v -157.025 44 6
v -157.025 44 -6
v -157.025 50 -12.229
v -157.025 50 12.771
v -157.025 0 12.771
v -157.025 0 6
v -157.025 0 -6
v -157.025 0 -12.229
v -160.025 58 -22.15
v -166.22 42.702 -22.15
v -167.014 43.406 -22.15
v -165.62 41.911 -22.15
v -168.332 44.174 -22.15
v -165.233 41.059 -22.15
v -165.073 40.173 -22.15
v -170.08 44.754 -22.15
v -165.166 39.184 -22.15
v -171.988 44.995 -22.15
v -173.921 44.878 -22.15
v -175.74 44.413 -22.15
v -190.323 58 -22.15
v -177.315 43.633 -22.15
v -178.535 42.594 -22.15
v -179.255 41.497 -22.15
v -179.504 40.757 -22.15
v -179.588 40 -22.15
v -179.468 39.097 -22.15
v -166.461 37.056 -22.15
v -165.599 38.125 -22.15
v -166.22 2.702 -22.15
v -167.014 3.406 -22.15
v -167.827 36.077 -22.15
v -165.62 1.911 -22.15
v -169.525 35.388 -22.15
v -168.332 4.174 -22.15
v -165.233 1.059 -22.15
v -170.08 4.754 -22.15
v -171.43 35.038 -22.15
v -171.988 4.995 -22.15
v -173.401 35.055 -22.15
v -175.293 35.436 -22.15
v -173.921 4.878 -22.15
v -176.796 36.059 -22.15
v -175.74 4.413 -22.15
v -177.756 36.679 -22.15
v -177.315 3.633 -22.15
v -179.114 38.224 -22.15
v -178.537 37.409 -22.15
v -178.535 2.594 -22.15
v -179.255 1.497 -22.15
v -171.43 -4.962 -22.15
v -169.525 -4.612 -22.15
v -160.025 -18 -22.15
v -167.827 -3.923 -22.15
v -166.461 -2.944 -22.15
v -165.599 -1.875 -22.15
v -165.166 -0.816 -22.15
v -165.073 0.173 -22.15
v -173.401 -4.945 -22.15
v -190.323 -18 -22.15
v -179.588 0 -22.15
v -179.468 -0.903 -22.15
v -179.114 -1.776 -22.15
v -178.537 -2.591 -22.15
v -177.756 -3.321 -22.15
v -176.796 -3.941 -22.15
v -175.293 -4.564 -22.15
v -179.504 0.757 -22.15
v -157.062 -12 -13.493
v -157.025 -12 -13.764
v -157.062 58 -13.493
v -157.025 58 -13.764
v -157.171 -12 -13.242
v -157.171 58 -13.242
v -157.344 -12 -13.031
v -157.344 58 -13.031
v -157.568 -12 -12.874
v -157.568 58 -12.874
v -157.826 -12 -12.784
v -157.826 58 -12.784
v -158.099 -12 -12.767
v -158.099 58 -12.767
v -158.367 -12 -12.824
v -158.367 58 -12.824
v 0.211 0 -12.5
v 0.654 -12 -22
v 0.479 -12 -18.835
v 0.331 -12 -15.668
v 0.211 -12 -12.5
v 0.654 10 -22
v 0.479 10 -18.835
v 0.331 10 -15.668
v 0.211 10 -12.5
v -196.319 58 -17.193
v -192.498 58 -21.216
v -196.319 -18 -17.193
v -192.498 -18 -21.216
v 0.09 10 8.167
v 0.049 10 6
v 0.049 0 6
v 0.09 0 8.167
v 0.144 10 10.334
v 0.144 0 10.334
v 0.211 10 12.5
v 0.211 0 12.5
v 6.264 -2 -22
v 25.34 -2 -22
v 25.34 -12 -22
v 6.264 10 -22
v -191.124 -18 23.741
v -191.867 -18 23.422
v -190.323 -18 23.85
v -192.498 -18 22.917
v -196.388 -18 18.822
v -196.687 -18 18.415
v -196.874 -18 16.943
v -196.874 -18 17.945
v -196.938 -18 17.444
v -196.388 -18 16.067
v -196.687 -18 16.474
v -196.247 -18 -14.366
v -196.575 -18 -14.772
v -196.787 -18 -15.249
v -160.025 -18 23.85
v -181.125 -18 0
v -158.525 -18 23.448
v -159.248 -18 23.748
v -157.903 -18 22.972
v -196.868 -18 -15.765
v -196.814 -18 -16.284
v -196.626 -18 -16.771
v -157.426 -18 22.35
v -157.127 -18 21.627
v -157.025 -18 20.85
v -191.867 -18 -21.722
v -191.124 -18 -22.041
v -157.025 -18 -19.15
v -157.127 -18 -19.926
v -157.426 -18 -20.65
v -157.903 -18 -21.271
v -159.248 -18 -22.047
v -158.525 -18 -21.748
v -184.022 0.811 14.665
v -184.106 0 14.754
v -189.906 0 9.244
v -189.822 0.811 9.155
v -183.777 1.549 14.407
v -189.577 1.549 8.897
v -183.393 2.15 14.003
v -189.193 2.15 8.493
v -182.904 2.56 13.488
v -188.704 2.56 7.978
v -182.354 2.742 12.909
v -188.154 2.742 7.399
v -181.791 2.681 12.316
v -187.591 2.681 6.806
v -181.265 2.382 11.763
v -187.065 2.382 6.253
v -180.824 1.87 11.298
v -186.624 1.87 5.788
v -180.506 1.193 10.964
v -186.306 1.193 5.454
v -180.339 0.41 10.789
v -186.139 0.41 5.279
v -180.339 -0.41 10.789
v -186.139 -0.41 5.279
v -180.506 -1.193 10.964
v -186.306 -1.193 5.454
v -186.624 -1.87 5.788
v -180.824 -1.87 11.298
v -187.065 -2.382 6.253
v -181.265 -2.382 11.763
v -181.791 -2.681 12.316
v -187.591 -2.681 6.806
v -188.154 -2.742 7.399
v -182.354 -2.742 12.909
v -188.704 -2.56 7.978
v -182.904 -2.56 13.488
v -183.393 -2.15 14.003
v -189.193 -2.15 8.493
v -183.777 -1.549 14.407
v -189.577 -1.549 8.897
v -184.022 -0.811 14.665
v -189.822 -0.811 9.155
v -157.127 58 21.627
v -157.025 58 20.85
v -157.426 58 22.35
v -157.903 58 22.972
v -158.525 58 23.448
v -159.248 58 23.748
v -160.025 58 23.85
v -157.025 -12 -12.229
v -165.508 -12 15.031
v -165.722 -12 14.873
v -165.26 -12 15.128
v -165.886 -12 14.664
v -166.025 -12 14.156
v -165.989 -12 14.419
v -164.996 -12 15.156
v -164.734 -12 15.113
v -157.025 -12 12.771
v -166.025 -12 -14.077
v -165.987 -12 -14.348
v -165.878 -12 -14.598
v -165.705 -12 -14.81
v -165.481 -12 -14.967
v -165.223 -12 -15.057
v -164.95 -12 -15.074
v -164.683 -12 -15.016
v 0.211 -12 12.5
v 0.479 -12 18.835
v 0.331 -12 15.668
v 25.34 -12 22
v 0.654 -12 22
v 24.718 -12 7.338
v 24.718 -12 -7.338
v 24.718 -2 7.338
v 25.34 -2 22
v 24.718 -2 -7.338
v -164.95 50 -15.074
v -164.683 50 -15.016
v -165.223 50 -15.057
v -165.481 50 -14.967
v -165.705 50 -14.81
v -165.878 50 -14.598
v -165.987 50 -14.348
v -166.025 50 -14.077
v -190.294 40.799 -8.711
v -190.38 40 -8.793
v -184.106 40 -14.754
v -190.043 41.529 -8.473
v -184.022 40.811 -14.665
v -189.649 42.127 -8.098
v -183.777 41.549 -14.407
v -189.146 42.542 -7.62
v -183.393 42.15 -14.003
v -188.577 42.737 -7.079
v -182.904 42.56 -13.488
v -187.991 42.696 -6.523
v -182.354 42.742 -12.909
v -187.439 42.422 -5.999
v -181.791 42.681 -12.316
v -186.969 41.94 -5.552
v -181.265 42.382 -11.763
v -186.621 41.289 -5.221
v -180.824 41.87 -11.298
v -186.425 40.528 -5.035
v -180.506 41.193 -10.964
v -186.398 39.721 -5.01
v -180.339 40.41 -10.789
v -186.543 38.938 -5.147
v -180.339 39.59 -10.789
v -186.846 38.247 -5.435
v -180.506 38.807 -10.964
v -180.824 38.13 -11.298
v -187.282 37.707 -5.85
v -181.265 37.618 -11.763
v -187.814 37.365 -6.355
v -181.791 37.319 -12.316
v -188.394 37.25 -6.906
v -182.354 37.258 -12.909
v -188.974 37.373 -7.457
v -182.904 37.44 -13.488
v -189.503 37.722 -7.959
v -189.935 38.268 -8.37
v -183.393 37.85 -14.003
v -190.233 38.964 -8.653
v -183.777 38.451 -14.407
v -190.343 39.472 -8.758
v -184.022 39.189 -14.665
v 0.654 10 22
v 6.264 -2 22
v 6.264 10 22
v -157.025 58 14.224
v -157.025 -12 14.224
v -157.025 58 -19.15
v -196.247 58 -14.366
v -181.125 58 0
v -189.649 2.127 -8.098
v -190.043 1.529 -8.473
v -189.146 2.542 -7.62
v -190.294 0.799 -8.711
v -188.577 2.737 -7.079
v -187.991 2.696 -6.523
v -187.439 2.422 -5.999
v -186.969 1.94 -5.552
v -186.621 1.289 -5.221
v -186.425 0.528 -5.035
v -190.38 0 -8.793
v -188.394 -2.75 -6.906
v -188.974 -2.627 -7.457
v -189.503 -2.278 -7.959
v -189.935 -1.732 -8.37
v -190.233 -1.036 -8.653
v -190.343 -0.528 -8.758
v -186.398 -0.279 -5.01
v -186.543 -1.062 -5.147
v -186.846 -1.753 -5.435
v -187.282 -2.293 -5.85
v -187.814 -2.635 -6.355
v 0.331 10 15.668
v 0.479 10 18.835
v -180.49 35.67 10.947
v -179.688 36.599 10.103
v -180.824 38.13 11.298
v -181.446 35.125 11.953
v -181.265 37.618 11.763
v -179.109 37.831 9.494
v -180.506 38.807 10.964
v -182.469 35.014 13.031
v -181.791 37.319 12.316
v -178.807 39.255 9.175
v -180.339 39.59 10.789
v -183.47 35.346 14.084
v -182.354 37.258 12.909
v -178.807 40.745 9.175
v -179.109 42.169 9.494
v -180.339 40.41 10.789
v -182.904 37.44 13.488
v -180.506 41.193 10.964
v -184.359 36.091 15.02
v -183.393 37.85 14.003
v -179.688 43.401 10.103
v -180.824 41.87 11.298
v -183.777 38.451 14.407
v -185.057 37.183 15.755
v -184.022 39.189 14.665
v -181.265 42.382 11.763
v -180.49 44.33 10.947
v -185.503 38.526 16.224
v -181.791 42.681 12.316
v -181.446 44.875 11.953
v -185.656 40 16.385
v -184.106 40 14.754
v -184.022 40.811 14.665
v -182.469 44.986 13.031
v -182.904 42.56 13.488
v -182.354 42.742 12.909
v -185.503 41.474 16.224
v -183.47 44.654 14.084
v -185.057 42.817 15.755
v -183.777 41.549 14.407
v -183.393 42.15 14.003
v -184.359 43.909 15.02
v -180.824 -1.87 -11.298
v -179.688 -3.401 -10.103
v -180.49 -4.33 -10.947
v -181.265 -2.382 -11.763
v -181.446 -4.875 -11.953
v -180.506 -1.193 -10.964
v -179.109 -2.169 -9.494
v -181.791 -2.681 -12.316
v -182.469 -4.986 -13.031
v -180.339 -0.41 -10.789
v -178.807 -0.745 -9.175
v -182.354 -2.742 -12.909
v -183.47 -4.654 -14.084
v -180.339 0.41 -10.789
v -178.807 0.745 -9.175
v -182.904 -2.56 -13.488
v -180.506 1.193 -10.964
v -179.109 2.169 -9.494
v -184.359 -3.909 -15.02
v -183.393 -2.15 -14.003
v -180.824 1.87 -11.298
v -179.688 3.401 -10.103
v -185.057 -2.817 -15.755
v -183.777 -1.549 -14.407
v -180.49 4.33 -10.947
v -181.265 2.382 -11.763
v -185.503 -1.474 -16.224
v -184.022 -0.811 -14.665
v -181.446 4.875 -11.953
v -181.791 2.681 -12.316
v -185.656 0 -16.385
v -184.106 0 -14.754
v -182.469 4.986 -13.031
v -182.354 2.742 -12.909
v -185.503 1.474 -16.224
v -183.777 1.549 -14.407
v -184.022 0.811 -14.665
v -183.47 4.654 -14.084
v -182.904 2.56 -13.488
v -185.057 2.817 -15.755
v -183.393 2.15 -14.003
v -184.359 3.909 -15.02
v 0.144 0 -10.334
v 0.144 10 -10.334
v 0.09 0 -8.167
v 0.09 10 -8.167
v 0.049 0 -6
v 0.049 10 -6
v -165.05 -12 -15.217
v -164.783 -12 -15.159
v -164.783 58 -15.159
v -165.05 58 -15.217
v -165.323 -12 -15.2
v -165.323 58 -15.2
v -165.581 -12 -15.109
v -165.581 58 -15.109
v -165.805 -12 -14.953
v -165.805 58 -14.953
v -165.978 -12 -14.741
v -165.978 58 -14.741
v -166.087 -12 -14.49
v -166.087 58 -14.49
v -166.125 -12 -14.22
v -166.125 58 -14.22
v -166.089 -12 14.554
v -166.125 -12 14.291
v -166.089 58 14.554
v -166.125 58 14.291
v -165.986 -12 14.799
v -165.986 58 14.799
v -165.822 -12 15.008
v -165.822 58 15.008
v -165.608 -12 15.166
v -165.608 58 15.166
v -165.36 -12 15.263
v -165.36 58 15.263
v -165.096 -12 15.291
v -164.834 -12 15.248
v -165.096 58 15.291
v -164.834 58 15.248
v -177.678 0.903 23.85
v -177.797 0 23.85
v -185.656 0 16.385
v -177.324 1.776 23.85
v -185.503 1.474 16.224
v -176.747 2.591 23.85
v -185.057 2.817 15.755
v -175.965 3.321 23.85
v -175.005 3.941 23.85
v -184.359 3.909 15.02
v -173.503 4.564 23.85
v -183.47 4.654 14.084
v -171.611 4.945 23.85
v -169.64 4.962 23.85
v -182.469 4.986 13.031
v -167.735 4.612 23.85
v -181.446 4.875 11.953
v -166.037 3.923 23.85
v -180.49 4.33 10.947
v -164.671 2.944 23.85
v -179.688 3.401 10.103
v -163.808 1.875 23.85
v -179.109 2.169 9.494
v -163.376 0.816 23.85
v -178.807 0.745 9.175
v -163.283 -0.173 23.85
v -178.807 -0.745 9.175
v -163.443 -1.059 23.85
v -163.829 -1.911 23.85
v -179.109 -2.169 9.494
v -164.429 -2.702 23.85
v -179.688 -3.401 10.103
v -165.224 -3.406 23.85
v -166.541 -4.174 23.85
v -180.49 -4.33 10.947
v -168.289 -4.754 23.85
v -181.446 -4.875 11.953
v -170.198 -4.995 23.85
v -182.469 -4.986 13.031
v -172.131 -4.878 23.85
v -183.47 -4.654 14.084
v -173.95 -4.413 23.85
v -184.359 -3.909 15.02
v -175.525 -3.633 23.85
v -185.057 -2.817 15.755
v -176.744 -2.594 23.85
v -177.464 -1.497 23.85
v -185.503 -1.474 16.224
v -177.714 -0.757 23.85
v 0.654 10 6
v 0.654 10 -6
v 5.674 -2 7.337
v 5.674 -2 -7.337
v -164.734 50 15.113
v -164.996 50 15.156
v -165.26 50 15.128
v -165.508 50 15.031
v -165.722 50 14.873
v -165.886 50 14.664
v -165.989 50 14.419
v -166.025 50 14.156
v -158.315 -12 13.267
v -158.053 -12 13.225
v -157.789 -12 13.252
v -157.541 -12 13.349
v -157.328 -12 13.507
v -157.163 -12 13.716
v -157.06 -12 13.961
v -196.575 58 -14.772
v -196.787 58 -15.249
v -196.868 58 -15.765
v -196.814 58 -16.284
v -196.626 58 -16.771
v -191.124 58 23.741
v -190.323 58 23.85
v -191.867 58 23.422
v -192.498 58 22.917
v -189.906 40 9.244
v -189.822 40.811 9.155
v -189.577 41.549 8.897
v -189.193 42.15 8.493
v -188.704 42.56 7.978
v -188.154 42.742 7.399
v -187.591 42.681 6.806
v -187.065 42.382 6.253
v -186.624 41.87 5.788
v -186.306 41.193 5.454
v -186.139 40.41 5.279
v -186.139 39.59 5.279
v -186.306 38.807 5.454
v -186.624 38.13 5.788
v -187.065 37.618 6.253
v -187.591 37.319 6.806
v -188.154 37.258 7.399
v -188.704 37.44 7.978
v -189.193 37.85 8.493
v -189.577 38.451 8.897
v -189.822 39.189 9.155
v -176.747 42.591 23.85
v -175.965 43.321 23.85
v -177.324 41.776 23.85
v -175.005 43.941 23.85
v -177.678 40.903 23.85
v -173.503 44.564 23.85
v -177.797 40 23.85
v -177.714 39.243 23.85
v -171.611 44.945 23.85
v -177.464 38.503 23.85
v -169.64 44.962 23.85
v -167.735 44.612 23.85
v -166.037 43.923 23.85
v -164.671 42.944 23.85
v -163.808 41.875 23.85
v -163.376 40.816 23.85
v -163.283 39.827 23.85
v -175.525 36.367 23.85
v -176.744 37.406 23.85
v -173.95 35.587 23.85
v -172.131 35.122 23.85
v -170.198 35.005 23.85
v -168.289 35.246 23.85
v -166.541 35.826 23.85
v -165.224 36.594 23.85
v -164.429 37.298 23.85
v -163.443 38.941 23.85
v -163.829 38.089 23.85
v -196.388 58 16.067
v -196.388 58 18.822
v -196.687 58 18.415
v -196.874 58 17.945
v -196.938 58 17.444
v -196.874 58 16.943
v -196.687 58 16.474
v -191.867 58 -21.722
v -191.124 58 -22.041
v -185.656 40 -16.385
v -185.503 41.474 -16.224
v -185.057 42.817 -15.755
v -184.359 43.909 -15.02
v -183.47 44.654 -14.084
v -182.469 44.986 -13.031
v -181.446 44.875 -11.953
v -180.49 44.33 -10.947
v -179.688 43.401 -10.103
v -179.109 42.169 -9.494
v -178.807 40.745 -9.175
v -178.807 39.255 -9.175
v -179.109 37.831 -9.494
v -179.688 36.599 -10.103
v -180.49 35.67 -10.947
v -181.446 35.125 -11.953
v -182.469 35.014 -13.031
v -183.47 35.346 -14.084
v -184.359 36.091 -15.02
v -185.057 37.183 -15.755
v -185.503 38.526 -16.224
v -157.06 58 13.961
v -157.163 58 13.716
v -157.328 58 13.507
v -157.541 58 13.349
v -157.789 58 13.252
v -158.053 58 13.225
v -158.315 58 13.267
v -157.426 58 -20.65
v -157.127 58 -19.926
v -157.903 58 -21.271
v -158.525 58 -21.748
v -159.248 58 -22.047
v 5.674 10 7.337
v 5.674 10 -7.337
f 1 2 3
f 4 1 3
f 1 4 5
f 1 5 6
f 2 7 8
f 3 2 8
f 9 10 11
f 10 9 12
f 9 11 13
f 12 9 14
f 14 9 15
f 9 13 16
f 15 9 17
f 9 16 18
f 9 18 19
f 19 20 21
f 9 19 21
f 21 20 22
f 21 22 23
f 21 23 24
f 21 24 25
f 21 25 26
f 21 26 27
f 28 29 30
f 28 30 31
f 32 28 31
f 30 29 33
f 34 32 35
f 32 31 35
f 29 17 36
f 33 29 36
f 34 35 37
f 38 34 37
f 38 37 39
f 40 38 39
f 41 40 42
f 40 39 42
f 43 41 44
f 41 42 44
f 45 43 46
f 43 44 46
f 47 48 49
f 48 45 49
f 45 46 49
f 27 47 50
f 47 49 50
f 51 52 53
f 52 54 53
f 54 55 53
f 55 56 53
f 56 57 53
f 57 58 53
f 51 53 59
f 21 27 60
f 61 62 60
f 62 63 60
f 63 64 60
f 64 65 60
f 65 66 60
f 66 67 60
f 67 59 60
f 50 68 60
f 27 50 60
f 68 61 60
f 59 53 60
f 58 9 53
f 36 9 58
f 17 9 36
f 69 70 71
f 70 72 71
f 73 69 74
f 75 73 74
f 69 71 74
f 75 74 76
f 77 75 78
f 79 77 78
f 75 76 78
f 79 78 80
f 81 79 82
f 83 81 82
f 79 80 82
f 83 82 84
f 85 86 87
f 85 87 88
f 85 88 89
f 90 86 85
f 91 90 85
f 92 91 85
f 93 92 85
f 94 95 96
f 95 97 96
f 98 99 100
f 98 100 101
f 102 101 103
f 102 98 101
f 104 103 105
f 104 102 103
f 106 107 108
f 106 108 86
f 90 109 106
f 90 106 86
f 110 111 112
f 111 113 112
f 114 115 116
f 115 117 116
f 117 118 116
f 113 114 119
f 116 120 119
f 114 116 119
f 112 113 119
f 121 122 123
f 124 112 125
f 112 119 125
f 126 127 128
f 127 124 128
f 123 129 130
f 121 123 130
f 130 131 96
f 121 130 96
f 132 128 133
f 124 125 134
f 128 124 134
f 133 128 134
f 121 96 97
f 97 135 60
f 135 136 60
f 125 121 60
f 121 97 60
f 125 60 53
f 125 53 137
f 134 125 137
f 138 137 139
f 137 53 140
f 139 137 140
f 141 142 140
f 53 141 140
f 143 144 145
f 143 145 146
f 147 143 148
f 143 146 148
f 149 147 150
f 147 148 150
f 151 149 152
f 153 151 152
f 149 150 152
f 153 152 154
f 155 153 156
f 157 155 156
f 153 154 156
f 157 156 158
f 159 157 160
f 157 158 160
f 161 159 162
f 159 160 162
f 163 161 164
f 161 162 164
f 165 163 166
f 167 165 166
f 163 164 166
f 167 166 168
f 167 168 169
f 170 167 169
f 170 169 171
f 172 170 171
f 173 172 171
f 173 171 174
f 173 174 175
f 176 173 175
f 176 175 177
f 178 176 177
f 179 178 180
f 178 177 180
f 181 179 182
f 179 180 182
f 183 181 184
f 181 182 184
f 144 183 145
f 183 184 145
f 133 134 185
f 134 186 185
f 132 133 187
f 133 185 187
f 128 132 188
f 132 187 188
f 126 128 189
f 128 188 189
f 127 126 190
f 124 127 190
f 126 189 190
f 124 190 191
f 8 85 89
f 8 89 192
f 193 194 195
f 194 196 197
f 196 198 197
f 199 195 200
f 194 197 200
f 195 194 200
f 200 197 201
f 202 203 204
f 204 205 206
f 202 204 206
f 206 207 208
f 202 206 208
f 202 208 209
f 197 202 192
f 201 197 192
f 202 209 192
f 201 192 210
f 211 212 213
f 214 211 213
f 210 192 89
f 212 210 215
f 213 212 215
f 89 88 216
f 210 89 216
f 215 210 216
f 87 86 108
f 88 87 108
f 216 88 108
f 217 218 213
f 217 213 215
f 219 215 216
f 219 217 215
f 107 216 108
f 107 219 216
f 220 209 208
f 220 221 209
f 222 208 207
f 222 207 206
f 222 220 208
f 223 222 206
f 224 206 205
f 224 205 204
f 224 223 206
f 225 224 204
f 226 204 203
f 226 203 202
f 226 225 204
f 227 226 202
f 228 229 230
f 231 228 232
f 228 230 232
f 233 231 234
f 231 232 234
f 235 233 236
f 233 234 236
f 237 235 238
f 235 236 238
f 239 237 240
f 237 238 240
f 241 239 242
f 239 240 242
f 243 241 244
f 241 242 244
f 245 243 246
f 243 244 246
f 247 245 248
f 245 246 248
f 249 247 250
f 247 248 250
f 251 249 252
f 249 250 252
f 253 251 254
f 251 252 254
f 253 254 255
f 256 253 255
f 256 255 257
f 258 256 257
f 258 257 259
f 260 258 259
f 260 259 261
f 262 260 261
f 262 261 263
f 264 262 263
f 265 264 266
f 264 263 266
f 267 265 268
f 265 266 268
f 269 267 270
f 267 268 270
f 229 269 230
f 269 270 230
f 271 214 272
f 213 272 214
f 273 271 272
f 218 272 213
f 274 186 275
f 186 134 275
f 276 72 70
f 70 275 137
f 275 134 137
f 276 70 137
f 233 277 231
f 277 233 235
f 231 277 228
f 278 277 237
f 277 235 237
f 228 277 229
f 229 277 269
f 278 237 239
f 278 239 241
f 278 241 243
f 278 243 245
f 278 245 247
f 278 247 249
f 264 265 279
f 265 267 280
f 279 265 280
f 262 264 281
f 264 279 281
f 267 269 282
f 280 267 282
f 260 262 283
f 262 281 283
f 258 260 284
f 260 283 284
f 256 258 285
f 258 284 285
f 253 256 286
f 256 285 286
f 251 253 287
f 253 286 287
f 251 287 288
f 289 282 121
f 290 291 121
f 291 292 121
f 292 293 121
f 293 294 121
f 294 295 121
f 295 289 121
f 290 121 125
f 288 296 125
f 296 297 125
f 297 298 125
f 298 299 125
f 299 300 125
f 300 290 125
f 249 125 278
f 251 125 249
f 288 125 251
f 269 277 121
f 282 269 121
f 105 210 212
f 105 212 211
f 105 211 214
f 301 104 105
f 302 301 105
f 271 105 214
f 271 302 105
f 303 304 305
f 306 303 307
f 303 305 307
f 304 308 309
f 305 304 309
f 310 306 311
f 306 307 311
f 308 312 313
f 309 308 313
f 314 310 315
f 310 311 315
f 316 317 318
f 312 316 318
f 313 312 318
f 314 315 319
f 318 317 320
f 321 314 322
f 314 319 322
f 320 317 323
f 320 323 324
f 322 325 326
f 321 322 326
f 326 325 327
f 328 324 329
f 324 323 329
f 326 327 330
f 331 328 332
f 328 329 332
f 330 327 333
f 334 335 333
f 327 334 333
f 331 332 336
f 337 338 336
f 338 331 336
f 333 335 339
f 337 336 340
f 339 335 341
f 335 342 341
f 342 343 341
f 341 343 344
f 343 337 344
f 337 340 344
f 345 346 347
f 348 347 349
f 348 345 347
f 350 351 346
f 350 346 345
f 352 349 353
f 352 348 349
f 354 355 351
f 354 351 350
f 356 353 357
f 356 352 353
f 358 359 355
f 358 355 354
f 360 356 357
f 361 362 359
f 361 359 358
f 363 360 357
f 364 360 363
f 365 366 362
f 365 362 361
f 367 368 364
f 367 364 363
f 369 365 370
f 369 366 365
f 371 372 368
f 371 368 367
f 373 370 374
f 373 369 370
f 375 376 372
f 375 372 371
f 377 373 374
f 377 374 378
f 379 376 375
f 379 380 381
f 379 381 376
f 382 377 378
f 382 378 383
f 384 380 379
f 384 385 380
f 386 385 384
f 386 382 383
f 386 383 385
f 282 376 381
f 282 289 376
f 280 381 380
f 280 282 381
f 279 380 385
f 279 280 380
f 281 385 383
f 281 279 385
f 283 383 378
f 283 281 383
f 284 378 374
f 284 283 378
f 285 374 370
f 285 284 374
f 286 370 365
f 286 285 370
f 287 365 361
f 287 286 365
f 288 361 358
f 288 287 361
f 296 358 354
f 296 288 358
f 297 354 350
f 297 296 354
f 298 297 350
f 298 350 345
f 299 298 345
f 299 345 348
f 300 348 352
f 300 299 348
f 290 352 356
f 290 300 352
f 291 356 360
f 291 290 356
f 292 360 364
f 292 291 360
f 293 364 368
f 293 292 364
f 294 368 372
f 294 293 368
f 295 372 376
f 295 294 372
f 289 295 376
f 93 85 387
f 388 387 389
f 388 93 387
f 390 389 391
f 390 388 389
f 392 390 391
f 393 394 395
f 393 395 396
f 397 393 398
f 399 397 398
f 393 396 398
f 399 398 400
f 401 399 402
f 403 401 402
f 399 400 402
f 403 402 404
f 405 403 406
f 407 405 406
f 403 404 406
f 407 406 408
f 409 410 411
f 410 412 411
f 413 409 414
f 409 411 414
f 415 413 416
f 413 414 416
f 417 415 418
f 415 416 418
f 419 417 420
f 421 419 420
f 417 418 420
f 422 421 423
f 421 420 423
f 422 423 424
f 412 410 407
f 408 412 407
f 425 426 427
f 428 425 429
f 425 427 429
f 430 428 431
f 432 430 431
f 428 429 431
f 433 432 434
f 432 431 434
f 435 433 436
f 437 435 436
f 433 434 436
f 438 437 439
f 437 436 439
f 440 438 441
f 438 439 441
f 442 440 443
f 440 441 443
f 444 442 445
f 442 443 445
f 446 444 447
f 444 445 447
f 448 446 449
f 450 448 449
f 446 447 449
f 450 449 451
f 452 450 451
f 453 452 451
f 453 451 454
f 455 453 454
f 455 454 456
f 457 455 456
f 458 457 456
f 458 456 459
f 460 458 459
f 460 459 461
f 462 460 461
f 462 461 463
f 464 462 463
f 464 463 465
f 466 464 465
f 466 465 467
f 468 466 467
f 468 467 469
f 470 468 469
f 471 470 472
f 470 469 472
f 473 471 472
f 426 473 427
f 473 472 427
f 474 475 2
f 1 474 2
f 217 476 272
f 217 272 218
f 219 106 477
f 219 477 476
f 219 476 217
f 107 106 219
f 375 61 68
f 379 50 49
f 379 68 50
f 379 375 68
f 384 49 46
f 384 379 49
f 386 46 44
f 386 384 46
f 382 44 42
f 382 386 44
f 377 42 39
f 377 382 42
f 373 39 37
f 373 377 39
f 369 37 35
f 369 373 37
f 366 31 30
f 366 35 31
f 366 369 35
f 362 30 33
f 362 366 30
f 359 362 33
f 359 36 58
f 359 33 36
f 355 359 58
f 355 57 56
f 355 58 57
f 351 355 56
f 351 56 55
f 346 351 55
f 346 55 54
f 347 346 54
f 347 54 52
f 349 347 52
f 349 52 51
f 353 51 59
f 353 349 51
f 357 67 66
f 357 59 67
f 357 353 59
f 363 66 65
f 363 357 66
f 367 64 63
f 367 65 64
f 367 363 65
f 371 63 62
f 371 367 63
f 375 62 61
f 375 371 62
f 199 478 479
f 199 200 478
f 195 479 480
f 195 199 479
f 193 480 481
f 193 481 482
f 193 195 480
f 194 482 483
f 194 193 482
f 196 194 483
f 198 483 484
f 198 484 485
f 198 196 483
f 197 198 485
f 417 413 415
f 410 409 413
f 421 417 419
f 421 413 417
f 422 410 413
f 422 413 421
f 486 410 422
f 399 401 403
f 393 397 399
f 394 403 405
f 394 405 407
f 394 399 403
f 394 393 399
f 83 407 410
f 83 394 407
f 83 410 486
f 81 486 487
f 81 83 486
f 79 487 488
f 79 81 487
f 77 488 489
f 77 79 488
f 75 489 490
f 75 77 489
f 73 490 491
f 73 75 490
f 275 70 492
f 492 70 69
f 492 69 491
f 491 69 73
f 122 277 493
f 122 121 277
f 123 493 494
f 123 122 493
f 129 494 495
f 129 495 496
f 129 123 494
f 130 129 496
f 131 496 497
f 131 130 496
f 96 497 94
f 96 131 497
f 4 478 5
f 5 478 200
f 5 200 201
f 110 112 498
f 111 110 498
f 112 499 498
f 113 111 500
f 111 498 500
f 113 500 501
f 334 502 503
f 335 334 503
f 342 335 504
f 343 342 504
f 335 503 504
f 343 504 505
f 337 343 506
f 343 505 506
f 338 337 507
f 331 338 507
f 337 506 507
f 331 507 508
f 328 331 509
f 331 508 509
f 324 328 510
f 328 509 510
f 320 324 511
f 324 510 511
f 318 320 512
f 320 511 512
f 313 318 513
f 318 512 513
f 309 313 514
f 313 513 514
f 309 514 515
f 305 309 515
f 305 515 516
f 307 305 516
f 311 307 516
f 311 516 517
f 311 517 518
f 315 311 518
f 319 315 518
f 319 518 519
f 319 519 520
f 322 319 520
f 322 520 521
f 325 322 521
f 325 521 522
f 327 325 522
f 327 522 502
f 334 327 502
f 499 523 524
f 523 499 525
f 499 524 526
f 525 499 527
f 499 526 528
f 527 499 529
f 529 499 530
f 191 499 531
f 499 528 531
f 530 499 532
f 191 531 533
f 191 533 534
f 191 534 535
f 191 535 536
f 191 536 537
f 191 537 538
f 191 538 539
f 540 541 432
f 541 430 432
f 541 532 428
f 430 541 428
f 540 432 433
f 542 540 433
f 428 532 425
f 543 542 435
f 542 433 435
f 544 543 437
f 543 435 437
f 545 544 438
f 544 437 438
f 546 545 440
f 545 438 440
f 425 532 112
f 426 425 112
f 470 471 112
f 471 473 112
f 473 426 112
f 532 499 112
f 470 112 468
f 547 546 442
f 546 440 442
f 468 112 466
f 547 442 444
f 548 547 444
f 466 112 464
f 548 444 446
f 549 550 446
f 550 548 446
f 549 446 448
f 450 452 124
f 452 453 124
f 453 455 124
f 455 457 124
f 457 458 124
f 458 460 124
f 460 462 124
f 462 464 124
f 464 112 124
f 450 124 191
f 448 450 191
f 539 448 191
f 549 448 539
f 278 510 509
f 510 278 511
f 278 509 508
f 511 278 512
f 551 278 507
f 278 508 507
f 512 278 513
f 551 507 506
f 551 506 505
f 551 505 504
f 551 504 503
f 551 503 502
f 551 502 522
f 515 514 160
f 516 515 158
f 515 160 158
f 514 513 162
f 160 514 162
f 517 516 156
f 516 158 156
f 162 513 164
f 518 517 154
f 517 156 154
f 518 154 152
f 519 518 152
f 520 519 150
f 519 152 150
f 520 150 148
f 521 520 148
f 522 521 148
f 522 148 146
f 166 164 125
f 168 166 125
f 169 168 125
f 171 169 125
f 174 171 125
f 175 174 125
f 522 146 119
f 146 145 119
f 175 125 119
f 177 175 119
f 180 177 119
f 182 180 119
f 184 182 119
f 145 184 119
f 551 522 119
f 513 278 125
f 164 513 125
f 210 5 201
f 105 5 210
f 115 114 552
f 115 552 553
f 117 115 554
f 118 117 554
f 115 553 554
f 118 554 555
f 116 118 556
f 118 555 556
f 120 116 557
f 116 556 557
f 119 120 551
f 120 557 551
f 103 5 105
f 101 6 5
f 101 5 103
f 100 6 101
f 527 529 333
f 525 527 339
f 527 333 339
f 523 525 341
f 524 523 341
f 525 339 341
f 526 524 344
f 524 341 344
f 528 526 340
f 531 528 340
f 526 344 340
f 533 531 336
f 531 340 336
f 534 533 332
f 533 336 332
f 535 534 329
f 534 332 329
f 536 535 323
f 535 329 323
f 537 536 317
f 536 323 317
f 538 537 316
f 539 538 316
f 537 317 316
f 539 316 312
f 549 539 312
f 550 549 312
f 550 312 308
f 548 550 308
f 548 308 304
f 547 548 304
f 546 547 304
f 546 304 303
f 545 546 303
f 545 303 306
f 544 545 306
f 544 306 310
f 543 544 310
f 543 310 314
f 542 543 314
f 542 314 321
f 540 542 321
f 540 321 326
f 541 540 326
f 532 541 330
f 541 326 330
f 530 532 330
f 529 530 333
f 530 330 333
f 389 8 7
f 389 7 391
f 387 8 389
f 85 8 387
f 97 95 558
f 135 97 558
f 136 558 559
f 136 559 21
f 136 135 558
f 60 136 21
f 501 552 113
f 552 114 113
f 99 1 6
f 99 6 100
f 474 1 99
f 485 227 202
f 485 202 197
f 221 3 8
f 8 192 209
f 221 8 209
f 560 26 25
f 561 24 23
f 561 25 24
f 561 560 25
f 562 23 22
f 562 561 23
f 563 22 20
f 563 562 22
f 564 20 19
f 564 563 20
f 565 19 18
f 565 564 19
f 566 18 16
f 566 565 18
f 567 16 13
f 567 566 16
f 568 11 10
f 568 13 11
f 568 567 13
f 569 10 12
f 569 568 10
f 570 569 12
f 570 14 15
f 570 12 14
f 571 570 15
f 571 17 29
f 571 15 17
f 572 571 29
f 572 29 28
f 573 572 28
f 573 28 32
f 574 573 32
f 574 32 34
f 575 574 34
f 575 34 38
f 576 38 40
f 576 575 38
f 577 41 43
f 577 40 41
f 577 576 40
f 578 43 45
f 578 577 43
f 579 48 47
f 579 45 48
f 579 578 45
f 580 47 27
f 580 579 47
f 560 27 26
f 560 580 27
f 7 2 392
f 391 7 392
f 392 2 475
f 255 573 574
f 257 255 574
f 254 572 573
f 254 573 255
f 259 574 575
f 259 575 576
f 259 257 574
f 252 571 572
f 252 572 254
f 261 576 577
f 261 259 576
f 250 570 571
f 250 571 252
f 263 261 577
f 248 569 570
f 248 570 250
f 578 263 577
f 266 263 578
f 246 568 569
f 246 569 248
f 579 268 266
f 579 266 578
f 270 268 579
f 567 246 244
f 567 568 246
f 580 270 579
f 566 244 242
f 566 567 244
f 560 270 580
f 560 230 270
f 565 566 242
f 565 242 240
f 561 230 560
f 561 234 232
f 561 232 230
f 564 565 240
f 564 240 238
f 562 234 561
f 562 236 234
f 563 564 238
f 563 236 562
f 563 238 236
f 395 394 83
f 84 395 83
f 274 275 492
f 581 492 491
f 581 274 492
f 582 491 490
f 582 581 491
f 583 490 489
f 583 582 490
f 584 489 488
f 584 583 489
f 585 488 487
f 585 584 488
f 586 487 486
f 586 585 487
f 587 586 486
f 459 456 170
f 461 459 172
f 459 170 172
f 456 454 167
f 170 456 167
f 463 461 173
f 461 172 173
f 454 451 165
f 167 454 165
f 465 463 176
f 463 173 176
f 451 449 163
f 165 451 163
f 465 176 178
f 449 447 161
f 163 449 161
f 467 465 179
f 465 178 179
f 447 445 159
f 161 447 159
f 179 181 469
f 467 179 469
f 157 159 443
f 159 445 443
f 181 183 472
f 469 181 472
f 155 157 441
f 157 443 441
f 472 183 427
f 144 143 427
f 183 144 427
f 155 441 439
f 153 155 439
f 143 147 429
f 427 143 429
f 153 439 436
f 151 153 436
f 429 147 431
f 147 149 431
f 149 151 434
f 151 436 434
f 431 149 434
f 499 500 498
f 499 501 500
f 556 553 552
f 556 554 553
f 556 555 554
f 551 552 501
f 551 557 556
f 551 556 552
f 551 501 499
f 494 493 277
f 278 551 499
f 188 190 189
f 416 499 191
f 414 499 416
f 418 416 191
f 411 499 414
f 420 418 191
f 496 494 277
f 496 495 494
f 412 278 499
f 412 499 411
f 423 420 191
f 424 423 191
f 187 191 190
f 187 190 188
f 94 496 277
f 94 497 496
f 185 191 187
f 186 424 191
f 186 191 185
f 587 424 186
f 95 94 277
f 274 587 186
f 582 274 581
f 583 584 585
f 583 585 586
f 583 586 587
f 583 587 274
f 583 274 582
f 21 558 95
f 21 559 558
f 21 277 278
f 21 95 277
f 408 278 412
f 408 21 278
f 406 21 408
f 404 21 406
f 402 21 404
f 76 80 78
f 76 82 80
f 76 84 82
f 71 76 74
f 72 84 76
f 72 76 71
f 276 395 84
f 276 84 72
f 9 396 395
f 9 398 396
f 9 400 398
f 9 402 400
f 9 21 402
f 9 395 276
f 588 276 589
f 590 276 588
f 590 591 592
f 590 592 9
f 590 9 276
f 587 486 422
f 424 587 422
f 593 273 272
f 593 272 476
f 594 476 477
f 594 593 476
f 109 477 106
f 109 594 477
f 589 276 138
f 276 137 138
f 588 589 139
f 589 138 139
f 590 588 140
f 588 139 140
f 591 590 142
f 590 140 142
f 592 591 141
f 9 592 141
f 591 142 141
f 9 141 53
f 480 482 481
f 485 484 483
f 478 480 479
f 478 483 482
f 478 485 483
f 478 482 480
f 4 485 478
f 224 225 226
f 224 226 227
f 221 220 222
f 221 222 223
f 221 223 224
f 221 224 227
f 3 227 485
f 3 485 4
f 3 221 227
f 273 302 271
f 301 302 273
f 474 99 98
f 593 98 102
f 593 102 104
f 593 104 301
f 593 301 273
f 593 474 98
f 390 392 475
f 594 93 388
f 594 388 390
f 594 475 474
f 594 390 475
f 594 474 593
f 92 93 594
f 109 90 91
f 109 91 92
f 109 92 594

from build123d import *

# Parameters (mm, degrees)
BOSS_EXTRUDE2_DEPTH       = 12
BOSS_EXTRUDE3_START       = -2
BOSS_EXTRUDE3_DEPTH       = 10
BOSS_EXTRUDE4_START       = 10
BOSS_EXTRUDE4_DEPTH       = 22
BOSS_EXTRUDE5_START       = -12
BOSS_EXTRUDE5_DEPTH       = 6
BOSS_EXTRUDE6_START       = -12
BOSS_EXTRUDE6_DEPTH       = 70
BOSS_EXTRUDE7_DEPTH       = 50
BOSS_EXTRUDE17_DEPTH      = 6
BOSS_EXTRUDE17_DEPTH_BACK = 6
CUT_EXTRUDE1_START        = -8
SKETCH5_R                 = 5
CUT_EXTRUDE1_DEPTH        = 168.948348154
SKETCH5_3_R               = 2.75
CUT_EXTRUDE2_DEPTH        = 176.948348154
FILLET1_R                 = 1
FILLET2_R                 = 1
FILLET3_R                 = 3
FILLET4_R                 = 2


with BuildPart() as part:
    # Sketch2 → Boss-Extrude2 (new body)
    with BuildSketch(Plane(origin=(0, 0, 0), x_dir=(1, 0, 0), z_dir=(0, 1, 0))):
        with BuildLine():
            Line((0.21086679, 12.5), (-157.02456554, 12.229205734))
            Line((-157.02456554, 12.229205734), (-157.02456554, -12.770794266))
            Line((-157.02456554, -12.770794266), (0.21086679, -12.5))
            ThreePointArc((0.21086679, -12.5), (0, 0), (0.21086679, 12.5))
        make_face()
        Polygon((-157.02456554, 12.229205734), (-166.02456554, 12.213705739), (-166.02456554, -12.786294261), (-157.02456554, -12.770794266), align=None)
        Polygon((-157.02456554, -12.770794266), (-166.02456554, -12.786294261), (-166.02456554, -15.504937842), align=None)
        Polygon((-166.02456554, 15.504937842), (-166.02456554, 12.213705739), (-157.02456554, 12.229205734), align=None)
        with BuildLine():
            ThreePointArc((0.653571446, 22), (0.401744327, 17.25142014), (0.21086679, 12.5))
            ThreePointArc((0.21086679, 12.5), (0, 0), (0.21086679, -12.5))
            ThreePointArc((0.21086679, -12.5), (0.401744327, -17.25142014), (0.653571446, -22))
            Line((0.653571446, -22), (6.263616969, -22))
            ThreePointArc((6.263616969, -22), (5.6, 0), (6.263616969, 22))
            Line((6.263616969, 22), (0.653571446, 22))
        make_face()
    extrude(amount=-BOSS_EXTRUDE2_DEPTH)

    # Sketch2<5> → Boss-Extrude3 (add)
    with BuildSketch(Plane(origin=(0, 0, 0), x_dir=(1, 0, 0), z_dir=(0, 1, 0)).offset(BOSS_EXTRUDE3_START)):
        with BuildLine():
            Line((25.340211435, 22), (6.263616969, 22))
            ThreePointArc((6.263616969, 22), (5.6, 0), (6.263616969, -22))
            Line((6.263616969, -22), (25.340211435, -22))
            ThreePointArc((25.340211435, -22), (24.64, 0), (25.340211435, 22))
        make_face()
    extrude(amount=-BOSS_EXTRUDE3_DEPTH)

    # Sketch2<6> → Boss-Extrude4 (add)
    with BuildSketch(Plane(origin=(0, 0, 0), x_dir=(1, 0, 0), z_dir=(0, 1, 0)).offset(BOSS_EXTRUDE4_START)):
        with BuildLine():
            ThreePointArc((0.653571446, 22), (0.401744327, 17.25142014), (0.21086679, 12.5))
            ThreePointArc((0.21086679, 12.5), (0, 0), (0.21086679, -12.5))
            ThreePointArc((0.21086679, -12.5), (0.401744327, -17.25142014), (0.653571446, -22))
            Line((0.653571446, -22), (6.263616969, -22))
            ThreePointArc((6.263616969, -22), (5.6, 0), (6.263616969, 22))
            Line((6.263616969, 22), (0.653571446, 22))
        make_face()
    extrude(amount=-BOSS_EXTRUDE4_DEPTH)

    # Sketch2<9> → Boss-Extrude7 (add)
    with BuildSketch(Plane(origin=(0, 0, 0), x_dir=(1, 0, 0), z_dir=(0, 1, 0))):
        Polygon((-157.02456554, 12.229205734), (-166.02456554, 12.213705739), (-166.02456554, -12.786294261), (-157.02456554, -12.770794266), align=None)
        Polygon((-166.02456554, 15.504937842), (-166.02456554, 12.213705739), (-157.02456554, 12.229205734), align=None)
        Polygon((-157.02456554, -12.770794266), (-166.02456554, -12.786294261), (-166.02456554, -15.504937842), align=None)
    extrude(amount=BOSS_EXTRUDE7_DEPTH)

    # Sketch4 → Boss-Extrude17 (add, two sides: drawn at the far end of the back side and taken through both)
    with BuildSketch(Plane.XY.offset(-BOSS_EXTRUDE17_DEPTH_BACK)):
        Polygon((0.653571446, 10), (-157.02456554, 44), (-157.02456554, 0), (0.653571446, 0), align=None)
    extrude(amount=BOSS_EXTRUDE17_DEPTH + BOSS_EXTRUDE17_DEPTH_BACK)

    # Fillet2
    fillet2_edges = [part.edges().sort_by_distance(p)[0] for p in [
        (-166.02456554, 19, 15.504937842),
        (-166.02456554, 19, -15.504937842),
    ]]
    fillet(fillet2_edges, radius=FILLET2_R)


with BuildPart() as body_2:
    # Sketch2<7> → Boss-Extrude5 (new body)
    with BuildSketch(Plane(origin=(0, 0, 0), x_dir=(1, 0, 0), z_dir=(0, 1, 0)).offset(BOSS_EXTRUDE5_START)):
        Polygon((-157.02456554, -23.850407561), (-157.02456554, 22.149592439), (-191.610767905, 22.149592439), (-197.696610314, 15.743442535), (-181.12456554, 0), (-197.696610314, -17.444257657), (-191.610767905, -23.850407561), align=None)
    extrude(amount=-BOSS_EXTRUDE5_DEPTH)

    # Sketch2<8> → Boss-Extrude6 (add)
    with BuildSketch(Plane(origin=(0, 0, 0), x_dir=(1, 0, 0), z_dir=(0, 1, 0)).offset(BOSS_EXTRUDE6_START)):
        Polygon((-197.696610314, 15.743442535), (-181.12456554, 0), (-197.696610314, -17.444257657), (-191.610767905, -23.850407561), (-157.02456554, -23.850407561), (-157.02456554, -12.875306975), (-166.12456554, -15.639829924), (-166.12456554, 15.647752643), (-157.02456554, 12.335623511), (-157.02456554, 22.149592439), (-191.610767905, 22.149592439), align=None)
    extrude(amount=BOSS_EXTRUDE6_DEPTH)

    # Sketch5 → Cut-Extrude1 (cut, through all)
    with BuildSketch(Plane(origin=(-95.203451007, 0, -90.443278456), x_dir=(-0.6887494619146907, 0, 0.724999433594416), z_dir=(-0.724999433594416, 0, -0.6887494619146907)).offset(CUT_EXTRUDE1_START)):
        with Locations((134.749447055, 40)):
            Circle(SKETCH5_R)
        with Locations((134.749447055, 0)):
            Circle(SKETCH5_R)
    cut_extrude1 = extrude(amount=-CUT_EXTRUDE1_DEPTH, mode=Mode.SUBTRACT)

    # Sketch5<3> → Cut-Extrude2 (cut, symmetric)
    with BuildSketch(Plane(origin=(-95.203451007, 0, -90.443278456), x_dir=(-0.6887494619146907, 0, 0.724999433594416), z_dir=(-0.724999433594416, 0, -0.6887494619146907))):
        with Locations((134.749447055, 40)):
            Circle(SKETCH5_3_R)
        with Locations((134.749447055, 0)):
            Circle(SKETCH5_3_R)
    cut_extrude2 = extrude(amount=CUT_EXTRUDE2_DEPTH, both=True, mode=Mode.SUBTRACT)

    # Mirror1: Cut-Extrude1, Cut-Extrude2 across plane
    add(cut_extrude1.mirror(Plane.XY), mode=Mode.SUBTRACT)
    add(cut_extrude2.mirror(Plane.XY), mode=Mode.SUBTRACT)

    # Fillet1
    fillet1_edges = [body_2.edges().sort_by_distance(p)[0] for p in [
        (-157.02456554, 23, 12.875306975),
        (-166.12456554, 23, 15.639829924),
        (-166.12456554, 23, -15.647752643),
        (-157.02456554, 23, -12.335623511),
    ]]
    fillet(fillet1_edges, radius=FILLET1_R)

    # Fillet3
    fillet3_edges = [body_2.edges().sort_by_distance(p)[0] for p in [
        (-157.02456554, 20, 23.850407561),
        (-157.02456554, 20, -22.149592439),
        (-191.610767905, 20, -22.149592439),
        (-191.610767905, 20, 23.850407561),
    ]]
    fillet(fillet3_edges, radius=FILLET3_R)

    # Fillet4
    fillet4_edges = [body_2.edges().sort_by_distance(p)[0] for p in [
        (-197.696610314, 20, -15.743442535),
        (-197.696610314, 20, 17.444257657),
    ]]
    fillet(fillet4_edges, radius=FILLET4_R)


solid = Compound([part.part, body_2.part])
